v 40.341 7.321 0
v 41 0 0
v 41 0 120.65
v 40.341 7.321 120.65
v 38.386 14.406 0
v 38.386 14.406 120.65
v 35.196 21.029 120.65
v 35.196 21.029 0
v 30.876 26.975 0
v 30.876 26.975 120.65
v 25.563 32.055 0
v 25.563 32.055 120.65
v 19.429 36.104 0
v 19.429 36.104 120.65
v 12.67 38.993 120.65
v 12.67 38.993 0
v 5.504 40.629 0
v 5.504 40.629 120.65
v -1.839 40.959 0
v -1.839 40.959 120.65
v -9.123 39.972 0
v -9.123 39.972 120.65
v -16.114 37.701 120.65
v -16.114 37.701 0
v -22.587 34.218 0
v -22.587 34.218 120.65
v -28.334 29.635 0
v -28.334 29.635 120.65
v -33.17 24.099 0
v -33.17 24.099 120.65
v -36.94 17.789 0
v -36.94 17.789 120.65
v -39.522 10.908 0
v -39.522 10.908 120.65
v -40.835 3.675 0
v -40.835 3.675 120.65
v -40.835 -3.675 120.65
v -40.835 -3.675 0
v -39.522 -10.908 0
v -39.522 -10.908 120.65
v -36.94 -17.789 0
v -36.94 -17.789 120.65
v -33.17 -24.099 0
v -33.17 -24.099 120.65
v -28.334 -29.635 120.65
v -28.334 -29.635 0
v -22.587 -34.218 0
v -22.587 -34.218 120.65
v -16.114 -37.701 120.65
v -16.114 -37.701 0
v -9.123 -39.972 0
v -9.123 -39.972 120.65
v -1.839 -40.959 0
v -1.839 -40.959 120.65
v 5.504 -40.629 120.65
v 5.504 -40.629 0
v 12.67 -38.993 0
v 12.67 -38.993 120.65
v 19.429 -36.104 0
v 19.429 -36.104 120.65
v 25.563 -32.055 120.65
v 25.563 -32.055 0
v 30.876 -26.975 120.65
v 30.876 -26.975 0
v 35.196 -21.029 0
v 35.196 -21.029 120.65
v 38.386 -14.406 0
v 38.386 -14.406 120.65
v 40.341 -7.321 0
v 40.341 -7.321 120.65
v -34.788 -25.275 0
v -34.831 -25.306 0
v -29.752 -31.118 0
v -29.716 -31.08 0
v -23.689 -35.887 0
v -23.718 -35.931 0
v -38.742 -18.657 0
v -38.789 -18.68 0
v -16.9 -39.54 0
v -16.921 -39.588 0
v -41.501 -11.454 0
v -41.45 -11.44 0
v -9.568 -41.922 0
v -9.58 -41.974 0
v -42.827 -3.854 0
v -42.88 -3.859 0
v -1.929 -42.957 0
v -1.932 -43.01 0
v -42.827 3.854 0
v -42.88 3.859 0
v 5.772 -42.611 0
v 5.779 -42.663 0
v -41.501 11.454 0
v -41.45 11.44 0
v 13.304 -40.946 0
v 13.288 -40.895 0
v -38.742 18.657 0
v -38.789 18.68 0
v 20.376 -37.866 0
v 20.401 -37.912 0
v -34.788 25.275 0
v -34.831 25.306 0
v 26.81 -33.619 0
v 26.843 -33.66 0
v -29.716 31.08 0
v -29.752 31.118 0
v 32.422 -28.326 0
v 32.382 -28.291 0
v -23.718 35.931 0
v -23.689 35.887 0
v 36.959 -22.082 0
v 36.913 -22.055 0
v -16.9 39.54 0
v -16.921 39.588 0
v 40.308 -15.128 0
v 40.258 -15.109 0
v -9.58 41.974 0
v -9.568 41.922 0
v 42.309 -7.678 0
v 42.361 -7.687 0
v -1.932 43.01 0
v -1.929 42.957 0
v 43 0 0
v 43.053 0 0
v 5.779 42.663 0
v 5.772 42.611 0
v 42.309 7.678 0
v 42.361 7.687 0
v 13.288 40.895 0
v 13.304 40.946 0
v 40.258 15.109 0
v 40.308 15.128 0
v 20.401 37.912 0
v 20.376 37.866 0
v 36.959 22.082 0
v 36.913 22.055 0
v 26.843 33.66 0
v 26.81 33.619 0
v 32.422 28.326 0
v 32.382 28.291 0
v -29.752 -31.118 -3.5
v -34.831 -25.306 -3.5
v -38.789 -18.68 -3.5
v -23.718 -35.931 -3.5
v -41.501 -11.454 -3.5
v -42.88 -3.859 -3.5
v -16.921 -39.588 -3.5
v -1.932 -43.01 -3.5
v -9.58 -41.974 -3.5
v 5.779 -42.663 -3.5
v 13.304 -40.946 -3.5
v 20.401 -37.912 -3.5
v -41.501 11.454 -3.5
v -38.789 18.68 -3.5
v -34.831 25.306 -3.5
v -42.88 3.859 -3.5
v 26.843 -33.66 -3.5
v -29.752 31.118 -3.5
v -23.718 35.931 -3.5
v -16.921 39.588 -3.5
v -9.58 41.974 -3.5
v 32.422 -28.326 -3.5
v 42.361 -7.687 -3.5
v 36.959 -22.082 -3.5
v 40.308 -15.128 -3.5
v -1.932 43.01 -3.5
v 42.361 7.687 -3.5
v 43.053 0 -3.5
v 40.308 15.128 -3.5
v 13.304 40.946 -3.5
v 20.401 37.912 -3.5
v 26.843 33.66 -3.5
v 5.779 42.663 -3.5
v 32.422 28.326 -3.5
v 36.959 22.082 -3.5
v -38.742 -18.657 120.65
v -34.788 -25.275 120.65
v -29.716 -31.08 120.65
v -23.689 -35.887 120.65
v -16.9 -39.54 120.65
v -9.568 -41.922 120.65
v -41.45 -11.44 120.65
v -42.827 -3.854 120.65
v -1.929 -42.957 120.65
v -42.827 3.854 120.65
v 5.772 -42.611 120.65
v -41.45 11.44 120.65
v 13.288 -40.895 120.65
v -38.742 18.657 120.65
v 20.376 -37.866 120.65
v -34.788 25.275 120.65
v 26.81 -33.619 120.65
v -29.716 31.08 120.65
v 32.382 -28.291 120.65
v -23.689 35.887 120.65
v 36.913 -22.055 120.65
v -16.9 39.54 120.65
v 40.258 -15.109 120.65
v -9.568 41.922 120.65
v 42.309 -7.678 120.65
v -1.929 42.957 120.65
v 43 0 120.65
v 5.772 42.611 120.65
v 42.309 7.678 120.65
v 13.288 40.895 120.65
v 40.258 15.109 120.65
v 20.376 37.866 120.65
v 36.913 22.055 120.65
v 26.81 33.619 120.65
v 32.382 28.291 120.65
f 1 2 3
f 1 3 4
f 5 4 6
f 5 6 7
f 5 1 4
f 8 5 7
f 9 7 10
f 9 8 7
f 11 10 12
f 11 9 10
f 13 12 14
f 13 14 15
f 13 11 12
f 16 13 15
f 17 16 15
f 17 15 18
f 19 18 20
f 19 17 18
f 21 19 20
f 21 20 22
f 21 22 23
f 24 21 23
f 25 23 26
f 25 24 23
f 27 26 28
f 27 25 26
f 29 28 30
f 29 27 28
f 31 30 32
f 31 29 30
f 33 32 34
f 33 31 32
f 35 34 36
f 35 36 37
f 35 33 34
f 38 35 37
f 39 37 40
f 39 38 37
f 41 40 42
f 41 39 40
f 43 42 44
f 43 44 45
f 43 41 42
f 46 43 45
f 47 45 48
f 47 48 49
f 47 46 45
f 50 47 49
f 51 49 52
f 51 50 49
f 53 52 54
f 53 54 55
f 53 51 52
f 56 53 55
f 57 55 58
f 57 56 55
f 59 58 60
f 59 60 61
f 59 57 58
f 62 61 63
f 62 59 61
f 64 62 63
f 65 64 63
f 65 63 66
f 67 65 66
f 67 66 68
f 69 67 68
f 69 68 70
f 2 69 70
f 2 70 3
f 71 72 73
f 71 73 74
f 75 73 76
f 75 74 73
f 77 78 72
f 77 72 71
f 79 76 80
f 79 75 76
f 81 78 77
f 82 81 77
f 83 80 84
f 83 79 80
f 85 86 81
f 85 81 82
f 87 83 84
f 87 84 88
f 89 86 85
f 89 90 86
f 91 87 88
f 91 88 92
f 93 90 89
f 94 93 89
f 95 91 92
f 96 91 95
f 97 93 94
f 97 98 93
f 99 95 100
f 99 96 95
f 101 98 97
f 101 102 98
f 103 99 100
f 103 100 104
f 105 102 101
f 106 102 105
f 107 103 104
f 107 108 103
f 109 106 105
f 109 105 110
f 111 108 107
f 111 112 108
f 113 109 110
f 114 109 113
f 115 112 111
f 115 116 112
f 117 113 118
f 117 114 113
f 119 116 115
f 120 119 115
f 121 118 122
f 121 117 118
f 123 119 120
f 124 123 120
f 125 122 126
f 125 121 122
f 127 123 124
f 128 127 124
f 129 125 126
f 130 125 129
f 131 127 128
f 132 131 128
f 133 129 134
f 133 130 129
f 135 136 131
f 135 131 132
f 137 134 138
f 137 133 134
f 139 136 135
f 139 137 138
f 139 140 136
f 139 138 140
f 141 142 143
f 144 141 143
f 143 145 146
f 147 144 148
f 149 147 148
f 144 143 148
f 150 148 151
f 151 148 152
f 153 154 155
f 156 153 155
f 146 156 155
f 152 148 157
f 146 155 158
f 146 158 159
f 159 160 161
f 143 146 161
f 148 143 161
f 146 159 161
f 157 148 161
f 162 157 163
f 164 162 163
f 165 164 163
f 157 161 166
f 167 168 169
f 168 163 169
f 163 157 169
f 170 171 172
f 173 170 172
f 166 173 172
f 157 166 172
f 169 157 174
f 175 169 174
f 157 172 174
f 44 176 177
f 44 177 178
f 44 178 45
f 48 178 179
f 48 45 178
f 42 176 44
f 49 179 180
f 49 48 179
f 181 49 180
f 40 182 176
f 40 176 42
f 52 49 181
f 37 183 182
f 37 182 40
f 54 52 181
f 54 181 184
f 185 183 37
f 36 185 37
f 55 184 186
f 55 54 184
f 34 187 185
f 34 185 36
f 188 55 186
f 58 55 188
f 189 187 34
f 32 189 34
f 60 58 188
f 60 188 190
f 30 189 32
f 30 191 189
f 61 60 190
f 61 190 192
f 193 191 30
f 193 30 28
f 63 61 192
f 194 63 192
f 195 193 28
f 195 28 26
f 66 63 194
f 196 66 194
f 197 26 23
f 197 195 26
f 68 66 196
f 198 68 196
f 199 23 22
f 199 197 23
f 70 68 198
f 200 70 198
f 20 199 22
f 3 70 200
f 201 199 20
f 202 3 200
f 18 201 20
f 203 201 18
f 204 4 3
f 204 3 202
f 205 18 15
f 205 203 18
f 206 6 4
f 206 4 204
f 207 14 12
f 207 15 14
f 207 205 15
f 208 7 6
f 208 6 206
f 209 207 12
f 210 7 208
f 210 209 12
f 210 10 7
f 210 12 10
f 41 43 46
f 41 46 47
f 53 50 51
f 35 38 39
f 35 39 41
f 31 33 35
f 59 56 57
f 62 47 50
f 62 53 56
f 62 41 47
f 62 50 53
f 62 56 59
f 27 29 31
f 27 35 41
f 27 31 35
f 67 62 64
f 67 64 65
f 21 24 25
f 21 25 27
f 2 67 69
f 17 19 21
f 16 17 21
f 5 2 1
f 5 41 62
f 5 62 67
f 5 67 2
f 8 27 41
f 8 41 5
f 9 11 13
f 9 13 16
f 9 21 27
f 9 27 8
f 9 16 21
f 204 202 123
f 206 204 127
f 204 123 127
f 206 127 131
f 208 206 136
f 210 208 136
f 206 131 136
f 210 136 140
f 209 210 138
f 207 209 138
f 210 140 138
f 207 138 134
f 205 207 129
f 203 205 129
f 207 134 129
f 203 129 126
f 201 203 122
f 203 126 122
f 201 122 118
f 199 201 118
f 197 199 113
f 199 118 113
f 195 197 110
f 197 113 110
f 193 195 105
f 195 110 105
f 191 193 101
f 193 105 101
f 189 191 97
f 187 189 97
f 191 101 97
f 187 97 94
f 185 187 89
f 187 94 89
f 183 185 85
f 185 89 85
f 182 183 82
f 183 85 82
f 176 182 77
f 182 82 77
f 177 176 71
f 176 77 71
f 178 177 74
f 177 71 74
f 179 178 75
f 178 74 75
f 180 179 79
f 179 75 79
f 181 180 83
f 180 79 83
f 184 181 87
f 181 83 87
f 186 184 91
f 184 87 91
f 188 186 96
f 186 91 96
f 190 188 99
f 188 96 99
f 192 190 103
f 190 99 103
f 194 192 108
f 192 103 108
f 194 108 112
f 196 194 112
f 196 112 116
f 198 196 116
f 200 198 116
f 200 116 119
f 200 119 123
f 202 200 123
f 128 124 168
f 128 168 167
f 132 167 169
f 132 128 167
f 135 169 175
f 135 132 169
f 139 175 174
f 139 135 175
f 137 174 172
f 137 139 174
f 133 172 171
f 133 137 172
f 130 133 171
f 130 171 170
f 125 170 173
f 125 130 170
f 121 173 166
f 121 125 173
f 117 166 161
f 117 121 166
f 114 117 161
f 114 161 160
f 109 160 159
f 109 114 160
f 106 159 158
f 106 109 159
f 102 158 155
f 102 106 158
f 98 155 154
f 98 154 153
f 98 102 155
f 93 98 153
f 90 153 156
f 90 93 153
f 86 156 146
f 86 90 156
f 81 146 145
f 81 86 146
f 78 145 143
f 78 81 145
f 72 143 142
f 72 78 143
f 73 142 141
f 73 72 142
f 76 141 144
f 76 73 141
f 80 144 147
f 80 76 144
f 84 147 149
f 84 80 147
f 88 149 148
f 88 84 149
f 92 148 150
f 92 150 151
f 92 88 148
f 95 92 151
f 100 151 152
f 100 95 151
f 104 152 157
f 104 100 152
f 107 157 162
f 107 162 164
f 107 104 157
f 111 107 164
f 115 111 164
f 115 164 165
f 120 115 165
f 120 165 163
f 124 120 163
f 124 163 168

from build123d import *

# Parameters (mm, degrees)
F2_R     = 43
F2_R_2   = 41
F0_DEPTH = 120.65
F3_R     = 43.053
F1_DEPTH = 3.5


with BuildPart() as f0:
    # F2 (on Top) → F0 (new body)
    with BuildSketch(Plane.XY):
        Circle(F2_R)
        Circle(F2_R_2, mode=Mode.SUBTRACT)
    extrude(amount=F0_DEPTH)

    # F3 (on Top) → F1 (join)
    with BuildSketch(Plane.XY):
        Circle(F3_R)
    extrude(amount=-F1_DEPTH)


solid = f0.part
